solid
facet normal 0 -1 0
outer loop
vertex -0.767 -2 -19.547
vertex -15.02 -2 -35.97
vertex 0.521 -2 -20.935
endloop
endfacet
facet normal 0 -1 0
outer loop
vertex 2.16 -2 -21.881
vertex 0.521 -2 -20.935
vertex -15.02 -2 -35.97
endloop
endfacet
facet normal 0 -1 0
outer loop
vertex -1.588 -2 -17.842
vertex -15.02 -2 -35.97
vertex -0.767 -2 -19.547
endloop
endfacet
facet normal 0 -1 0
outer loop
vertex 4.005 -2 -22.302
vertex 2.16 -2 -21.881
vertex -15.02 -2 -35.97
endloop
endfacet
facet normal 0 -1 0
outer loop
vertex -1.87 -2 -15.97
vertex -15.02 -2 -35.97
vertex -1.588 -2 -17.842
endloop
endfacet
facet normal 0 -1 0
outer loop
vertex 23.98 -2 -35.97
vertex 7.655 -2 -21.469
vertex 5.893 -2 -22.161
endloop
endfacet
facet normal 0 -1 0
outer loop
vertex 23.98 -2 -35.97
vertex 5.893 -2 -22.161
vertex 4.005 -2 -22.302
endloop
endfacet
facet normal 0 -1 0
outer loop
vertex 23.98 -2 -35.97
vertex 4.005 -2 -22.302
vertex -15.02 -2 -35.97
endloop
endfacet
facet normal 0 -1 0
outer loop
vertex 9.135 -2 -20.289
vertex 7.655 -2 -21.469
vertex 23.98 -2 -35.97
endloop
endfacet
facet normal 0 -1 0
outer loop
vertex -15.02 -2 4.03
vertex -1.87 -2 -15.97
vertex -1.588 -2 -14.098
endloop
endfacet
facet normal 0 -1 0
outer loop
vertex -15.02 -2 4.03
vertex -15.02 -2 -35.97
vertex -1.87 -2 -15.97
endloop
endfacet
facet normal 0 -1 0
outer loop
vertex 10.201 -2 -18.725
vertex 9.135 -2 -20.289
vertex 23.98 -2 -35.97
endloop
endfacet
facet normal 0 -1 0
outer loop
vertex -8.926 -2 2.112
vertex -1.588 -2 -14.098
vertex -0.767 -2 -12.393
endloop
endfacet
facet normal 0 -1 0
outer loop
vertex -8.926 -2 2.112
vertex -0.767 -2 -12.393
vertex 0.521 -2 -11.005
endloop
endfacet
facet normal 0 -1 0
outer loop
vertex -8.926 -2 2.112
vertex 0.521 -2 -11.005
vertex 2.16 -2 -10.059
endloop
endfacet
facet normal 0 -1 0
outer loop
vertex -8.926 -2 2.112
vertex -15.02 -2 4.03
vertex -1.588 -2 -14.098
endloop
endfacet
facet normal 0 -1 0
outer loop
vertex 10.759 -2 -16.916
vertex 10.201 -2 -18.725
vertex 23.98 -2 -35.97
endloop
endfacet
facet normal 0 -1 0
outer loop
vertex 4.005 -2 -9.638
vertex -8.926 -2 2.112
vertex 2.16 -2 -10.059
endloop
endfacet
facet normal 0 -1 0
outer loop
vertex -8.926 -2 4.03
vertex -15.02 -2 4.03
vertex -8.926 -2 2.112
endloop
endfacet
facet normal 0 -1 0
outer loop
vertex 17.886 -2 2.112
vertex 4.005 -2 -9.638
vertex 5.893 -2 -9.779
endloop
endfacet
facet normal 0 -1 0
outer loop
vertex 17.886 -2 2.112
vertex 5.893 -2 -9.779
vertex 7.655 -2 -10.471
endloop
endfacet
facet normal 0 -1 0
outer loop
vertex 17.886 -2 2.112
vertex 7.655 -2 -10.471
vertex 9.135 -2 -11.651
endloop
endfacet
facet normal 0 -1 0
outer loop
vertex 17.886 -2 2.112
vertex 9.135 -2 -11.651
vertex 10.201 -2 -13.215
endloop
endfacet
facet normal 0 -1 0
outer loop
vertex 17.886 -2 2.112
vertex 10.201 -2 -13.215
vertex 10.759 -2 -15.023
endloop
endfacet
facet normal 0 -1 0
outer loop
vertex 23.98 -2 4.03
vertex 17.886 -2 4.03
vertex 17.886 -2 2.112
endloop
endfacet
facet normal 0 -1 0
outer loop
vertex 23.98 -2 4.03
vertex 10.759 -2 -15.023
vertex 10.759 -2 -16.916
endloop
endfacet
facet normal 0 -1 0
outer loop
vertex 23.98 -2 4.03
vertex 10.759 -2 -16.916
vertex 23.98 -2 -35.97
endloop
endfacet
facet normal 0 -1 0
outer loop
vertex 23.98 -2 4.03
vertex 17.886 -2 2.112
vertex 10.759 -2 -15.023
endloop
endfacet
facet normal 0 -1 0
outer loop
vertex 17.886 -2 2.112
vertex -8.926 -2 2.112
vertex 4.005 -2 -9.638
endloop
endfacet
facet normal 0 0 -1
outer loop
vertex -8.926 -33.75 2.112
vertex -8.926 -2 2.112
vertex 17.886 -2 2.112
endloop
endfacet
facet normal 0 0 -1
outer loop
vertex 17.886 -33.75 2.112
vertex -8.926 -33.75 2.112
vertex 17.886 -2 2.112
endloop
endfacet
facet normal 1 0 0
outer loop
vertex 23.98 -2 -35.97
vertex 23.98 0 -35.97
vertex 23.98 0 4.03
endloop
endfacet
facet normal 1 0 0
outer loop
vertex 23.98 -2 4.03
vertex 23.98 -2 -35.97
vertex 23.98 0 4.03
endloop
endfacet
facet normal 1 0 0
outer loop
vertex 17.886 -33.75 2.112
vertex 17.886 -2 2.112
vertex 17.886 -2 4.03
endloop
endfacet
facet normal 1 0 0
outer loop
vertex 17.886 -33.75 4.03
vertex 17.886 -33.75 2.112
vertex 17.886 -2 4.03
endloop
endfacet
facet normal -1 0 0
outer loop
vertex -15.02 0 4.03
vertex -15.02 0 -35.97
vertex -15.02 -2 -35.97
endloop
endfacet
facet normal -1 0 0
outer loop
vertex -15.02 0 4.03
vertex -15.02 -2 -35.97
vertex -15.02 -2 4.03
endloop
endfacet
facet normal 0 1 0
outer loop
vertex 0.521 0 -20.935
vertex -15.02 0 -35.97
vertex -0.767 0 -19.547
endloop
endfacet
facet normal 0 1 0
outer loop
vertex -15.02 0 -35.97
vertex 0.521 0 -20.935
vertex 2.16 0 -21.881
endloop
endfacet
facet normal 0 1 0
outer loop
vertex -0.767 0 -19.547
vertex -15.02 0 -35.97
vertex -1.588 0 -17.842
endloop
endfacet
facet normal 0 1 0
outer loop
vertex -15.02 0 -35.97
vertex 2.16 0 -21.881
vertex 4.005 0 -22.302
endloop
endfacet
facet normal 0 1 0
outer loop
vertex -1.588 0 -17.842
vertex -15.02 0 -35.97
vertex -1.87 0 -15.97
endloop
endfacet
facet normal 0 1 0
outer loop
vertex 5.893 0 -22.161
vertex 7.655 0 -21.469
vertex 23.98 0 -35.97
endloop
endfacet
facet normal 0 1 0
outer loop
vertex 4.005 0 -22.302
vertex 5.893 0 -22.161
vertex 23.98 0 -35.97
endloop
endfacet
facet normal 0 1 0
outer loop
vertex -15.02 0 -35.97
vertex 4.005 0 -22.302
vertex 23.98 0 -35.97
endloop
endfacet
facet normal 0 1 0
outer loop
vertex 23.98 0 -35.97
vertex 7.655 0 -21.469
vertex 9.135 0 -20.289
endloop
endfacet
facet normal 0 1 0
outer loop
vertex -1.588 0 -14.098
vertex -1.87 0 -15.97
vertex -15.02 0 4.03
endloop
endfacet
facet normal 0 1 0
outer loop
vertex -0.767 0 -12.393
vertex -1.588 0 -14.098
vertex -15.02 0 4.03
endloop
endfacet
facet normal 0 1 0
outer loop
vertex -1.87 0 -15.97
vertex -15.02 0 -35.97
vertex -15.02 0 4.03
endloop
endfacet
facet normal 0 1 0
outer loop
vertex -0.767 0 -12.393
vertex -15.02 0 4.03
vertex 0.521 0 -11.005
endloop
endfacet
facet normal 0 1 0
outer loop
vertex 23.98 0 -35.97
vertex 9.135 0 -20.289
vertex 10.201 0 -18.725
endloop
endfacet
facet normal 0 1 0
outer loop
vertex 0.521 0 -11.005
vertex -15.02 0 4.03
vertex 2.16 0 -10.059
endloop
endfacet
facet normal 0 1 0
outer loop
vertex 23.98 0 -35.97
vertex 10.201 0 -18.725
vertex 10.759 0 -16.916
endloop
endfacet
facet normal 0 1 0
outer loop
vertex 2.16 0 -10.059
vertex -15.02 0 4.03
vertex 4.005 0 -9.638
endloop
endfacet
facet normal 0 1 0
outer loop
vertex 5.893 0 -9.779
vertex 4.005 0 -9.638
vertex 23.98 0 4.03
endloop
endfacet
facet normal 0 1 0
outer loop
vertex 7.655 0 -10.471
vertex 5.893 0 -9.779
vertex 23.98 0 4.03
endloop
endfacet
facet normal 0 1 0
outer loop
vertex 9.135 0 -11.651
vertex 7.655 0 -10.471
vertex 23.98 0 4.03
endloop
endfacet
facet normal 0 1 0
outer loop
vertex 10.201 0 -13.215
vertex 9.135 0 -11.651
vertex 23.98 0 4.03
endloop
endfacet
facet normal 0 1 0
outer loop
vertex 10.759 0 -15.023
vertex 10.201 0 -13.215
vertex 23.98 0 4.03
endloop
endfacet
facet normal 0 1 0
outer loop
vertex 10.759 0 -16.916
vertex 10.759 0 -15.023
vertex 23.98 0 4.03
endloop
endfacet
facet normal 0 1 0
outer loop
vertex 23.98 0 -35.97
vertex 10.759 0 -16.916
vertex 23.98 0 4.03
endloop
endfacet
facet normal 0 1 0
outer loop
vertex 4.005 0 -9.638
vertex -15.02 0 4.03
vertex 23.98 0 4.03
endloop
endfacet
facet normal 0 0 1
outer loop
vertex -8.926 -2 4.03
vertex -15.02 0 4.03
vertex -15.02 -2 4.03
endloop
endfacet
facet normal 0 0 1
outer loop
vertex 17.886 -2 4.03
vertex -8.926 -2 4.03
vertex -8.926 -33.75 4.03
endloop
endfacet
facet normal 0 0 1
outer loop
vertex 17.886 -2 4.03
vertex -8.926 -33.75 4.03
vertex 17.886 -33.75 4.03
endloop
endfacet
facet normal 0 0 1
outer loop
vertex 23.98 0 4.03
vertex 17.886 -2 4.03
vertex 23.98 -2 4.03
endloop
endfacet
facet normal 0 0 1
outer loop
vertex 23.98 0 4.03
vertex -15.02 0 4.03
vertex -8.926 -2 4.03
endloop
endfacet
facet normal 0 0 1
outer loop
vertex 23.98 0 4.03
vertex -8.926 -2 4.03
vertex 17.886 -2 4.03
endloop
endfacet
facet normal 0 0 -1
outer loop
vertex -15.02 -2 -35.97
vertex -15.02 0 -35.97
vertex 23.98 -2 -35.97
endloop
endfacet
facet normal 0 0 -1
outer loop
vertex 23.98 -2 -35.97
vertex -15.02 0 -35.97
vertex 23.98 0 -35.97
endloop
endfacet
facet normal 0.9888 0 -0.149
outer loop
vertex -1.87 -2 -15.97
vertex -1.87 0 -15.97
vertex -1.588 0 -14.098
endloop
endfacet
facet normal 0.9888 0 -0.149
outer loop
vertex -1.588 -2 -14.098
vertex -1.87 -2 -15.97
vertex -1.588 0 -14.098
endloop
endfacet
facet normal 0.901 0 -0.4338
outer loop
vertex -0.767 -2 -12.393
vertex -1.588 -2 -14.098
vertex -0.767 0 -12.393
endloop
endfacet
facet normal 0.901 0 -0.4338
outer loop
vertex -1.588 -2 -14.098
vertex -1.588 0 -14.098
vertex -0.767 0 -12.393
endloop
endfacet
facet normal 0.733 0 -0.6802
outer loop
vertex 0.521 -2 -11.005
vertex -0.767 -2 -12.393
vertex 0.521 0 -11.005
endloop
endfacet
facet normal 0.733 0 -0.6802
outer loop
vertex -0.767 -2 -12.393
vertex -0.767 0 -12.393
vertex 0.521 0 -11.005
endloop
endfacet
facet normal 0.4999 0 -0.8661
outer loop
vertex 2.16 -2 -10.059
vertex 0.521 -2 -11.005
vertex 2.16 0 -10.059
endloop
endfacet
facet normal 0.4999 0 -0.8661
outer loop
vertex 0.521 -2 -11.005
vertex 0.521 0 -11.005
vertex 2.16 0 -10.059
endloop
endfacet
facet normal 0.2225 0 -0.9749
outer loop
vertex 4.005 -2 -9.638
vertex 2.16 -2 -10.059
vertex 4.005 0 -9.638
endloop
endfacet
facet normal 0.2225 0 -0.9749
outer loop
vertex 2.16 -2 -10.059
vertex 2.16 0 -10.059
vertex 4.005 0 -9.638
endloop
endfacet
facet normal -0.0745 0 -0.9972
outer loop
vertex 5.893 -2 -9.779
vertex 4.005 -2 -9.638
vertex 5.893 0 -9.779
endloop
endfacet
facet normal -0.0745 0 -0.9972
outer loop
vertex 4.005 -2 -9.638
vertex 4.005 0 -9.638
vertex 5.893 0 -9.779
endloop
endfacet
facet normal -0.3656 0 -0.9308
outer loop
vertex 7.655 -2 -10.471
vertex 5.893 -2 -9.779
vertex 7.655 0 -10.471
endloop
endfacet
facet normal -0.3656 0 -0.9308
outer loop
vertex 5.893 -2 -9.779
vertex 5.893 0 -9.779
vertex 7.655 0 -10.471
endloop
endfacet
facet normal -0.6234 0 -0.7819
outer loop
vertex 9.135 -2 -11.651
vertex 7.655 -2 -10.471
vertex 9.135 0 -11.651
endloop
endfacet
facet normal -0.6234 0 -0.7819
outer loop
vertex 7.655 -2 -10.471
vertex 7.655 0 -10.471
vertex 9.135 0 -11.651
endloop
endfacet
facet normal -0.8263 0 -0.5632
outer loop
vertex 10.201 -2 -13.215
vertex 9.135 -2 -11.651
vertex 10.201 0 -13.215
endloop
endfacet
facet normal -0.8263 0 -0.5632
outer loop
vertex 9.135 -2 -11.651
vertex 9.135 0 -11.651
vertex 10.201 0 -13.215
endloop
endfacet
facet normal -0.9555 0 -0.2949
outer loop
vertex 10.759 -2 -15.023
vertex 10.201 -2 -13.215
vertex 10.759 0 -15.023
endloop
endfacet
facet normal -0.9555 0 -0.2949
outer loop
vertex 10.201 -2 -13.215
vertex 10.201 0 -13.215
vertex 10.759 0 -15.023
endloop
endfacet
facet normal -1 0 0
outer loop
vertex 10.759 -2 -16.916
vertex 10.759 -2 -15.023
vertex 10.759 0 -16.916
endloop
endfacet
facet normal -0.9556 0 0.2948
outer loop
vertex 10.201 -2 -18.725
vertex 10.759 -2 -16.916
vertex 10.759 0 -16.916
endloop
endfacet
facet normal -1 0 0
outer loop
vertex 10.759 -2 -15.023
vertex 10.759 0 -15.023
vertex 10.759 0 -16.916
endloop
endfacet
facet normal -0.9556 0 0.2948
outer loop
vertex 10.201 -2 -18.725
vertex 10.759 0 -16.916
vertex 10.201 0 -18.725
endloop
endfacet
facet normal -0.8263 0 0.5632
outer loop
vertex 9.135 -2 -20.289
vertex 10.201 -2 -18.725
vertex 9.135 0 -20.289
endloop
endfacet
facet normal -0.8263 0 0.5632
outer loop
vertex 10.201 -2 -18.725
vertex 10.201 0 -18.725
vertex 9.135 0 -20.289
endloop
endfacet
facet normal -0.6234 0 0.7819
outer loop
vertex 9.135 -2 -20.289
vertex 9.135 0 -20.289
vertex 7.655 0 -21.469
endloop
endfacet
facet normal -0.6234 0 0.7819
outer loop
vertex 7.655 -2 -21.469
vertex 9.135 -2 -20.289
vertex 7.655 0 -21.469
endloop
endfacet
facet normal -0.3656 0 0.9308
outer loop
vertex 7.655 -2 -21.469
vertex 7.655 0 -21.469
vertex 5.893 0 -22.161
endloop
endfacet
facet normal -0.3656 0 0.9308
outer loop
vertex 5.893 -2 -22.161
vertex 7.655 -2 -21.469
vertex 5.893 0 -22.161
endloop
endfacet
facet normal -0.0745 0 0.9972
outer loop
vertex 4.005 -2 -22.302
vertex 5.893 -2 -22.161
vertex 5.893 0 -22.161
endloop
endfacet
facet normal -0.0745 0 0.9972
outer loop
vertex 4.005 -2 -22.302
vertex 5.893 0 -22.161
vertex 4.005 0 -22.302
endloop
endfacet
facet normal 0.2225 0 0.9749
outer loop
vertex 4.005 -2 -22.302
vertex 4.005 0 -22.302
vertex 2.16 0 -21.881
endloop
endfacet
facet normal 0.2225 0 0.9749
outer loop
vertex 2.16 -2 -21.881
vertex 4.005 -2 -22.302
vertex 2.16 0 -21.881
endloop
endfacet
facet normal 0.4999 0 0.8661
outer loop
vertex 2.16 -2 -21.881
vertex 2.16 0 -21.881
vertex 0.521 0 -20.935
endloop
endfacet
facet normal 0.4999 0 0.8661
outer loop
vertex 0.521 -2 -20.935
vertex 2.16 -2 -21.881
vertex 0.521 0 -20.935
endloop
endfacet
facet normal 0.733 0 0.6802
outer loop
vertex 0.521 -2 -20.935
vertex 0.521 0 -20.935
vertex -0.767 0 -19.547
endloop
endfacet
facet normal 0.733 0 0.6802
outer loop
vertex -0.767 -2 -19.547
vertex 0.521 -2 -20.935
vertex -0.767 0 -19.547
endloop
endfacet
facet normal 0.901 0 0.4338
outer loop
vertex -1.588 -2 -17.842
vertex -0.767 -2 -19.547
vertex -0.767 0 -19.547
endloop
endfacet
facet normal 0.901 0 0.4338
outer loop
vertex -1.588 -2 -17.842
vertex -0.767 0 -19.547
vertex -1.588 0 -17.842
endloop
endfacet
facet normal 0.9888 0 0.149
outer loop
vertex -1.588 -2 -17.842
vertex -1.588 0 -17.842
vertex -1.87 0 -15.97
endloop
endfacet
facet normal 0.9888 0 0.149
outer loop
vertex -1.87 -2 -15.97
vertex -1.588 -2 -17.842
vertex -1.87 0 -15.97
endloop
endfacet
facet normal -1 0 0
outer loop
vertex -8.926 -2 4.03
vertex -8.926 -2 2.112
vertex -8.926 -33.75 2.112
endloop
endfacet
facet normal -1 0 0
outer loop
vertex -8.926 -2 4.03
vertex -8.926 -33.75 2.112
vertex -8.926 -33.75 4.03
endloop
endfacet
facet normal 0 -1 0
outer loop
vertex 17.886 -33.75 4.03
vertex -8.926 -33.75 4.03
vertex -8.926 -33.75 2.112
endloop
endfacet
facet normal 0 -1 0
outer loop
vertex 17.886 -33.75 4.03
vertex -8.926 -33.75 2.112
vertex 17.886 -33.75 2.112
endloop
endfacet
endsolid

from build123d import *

# Parameters (mm, degrees)
F0_W     = 39
F0_H     = 40
F1_DEPTH = 2
F2_W     = 26.8125
F2_H     = 1.9177
F3_DEPTH = 31.75
F5_D     = 12.7
F5_DEPTH = 76.2


with BuildPart() as f1:
    # F0 (on Front) → F1 (new body)
    with BuildSketch(Plane.XZ):
        with Locations((4.479941, -15.969917)):
            Rectangle(F0_W, F0_H)
    extrude(amount=F1_DEPTH)

    # F2 (on face) → F3 (join)
    with BuildSketch(Plane.XZ.offset(2)):
        with Locations((4.479941, 3.071233)):
            Rectangle(F2_W, F2_H)
    extrude(amount=F3_DEPTH)

    # F5
    with Locations(Plane.XZ.offset(2)):
        with Locations((4.479941, -15.969917)):
            Hole(F5_D / 2, depth=F5_DEPTH)


solid = f1.part
